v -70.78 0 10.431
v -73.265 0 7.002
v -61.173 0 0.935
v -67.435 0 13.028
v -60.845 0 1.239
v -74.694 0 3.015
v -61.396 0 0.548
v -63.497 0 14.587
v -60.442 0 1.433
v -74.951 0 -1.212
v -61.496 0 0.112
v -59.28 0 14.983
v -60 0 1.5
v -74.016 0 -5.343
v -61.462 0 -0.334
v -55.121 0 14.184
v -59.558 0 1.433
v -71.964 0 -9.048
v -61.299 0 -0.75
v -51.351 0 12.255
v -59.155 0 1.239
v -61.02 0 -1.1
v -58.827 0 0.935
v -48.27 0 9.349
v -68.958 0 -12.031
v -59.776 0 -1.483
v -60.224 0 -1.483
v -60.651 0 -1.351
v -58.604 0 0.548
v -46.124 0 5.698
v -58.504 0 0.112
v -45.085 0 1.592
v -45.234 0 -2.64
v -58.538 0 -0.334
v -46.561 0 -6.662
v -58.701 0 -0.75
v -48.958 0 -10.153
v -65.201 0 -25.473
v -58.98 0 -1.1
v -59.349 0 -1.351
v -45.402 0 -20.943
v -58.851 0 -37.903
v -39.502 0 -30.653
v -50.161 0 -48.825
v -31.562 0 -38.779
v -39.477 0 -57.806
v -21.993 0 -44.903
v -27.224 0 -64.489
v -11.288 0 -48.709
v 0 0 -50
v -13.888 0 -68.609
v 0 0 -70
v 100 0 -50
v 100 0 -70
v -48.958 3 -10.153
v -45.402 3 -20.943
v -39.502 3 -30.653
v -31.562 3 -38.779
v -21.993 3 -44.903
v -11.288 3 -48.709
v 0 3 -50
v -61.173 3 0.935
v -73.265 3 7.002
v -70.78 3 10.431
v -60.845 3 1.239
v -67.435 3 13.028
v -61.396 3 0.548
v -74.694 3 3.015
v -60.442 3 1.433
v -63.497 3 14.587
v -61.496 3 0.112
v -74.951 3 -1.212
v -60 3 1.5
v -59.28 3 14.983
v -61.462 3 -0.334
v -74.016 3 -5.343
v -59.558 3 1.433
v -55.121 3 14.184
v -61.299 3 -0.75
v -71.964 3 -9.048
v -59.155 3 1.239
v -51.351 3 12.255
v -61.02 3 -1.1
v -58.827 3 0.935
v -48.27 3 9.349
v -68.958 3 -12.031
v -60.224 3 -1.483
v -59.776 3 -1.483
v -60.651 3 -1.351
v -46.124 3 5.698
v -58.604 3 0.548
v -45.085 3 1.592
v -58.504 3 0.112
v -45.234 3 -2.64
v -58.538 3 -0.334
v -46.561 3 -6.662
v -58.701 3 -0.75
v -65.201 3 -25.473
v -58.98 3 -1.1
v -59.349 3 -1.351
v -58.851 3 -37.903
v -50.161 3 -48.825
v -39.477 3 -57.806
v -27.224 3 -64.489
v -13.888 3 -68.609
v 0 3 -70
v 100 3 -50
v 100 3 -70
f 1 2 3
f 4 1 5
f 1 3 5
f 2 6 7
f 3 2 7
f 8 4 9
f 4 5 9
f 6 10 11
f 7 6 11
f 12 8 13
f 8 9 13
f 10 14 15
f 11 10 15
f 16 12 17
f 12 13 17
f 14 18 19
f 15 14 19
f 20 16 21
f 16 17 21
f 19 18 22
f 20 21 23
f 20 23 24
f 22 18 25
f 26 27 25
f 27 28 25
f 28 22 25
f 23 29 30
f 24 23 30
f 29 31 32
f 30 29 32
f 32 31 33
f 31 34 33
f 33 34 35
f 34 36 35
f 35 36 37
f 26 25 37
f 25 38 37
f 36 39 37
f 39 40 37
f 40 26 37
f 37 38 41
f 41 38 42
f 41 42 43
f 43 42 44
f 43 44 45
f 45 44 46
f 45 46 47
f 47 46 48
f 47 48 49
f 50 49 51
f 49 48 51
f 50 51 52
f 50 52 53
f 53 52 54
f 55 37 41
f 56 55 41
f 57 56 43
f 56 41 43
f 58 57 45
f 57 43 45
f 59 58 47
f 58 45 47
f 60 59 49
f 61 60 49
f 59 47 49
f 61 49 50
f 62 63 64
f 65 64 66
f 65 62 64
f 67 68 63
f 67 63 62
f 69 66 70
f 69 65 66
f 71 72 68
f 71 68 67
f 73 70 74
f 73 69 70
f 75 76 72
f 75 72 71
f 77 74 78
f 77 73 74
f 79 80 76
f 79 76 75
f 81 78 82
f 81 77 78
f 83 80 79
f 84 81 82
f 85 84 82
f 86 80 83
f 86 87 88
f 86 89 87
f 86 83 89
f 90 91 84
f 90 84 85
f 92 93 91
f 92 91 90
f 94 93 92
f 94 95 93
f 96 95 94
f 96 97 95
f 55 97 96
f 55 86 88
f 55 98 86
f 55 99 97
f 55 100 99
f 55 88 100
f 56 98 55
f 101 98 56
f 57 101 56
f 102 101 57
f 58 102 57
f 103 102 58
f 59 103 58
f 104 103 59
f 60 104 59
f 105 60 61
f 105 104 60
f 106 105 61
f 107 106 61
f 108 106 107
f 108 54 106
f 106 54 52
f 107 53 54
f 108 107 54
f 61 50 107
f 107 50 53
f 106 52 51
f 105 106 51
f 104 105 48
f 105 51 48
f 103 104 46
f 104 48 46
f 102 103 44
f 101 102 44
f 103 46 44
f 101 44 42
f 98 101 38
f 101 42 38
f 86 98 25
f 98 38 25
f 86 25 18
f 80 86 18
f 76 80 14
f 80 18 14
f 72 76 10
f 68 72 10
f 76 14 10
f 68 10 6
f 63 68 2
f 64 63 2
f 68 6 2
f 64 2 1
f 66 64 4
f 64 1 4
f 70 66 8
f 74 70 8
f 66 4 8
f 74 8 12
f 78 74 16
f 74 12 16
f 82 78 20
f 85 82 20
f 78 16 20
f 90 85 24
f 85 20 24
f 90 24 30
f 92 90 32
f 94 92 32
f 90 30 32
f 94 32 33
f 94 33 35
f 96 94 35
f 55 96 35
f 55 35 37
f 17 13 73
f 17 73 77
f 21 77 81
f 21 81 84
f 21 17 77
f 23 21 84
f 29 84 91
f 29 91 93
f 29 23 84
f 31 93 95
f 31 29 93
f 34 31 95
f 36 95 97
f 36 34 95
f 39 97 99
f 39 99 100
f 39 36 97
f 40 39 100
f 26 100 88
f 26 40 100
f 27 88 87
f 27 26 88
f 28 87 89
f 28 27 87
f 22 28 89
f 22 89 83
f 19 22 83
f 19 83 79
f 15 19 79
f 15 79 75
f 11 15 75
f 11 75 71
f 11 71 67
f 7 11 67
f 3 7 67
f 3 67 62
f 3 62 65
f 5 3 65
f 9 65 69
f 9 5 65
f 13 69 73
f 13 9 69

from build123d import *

# Parameters (mm, degrees)
SKETCH1_R           = 1.5
BOSS_EXTRUDE1_DEPTH = 3


with BuildPart() as part:
    # Sketch1 → Boss-Extrude1 (new body)
    with BuildSketch(Plane(origin=(0, 0, 0), x_dir=(1, 0, 0), z_dir=(0, 1, 0))):
        with BuildLine():
            Line((0, 50), (100, 50))
            Line((100, 50), (100, 70))
            Line((100, 70), (0, 70))
            ThreePointArc((0, 70), (-45.043425666, 53.582551304), (-68.958333333, 12.031137265))
            ThreePointArc((-68.958333333, 12.031137265), (-61.402498888, -14.934289299), (-48.958333333, 10.152910776))
            ThreePointArc((-48.958333333, 10.152910776), (-31.562275435, 38.779153799), (0, 50))
        make_face()
        with Locations(Location((-60, 0, 0), (0, 0, 270))):
            Circle(SKETCH1_R, mode=Mode.SUBTRACT)
    extrude(amount=BOSS_EXTRUDE1_DEPTH)


solid = part.part
